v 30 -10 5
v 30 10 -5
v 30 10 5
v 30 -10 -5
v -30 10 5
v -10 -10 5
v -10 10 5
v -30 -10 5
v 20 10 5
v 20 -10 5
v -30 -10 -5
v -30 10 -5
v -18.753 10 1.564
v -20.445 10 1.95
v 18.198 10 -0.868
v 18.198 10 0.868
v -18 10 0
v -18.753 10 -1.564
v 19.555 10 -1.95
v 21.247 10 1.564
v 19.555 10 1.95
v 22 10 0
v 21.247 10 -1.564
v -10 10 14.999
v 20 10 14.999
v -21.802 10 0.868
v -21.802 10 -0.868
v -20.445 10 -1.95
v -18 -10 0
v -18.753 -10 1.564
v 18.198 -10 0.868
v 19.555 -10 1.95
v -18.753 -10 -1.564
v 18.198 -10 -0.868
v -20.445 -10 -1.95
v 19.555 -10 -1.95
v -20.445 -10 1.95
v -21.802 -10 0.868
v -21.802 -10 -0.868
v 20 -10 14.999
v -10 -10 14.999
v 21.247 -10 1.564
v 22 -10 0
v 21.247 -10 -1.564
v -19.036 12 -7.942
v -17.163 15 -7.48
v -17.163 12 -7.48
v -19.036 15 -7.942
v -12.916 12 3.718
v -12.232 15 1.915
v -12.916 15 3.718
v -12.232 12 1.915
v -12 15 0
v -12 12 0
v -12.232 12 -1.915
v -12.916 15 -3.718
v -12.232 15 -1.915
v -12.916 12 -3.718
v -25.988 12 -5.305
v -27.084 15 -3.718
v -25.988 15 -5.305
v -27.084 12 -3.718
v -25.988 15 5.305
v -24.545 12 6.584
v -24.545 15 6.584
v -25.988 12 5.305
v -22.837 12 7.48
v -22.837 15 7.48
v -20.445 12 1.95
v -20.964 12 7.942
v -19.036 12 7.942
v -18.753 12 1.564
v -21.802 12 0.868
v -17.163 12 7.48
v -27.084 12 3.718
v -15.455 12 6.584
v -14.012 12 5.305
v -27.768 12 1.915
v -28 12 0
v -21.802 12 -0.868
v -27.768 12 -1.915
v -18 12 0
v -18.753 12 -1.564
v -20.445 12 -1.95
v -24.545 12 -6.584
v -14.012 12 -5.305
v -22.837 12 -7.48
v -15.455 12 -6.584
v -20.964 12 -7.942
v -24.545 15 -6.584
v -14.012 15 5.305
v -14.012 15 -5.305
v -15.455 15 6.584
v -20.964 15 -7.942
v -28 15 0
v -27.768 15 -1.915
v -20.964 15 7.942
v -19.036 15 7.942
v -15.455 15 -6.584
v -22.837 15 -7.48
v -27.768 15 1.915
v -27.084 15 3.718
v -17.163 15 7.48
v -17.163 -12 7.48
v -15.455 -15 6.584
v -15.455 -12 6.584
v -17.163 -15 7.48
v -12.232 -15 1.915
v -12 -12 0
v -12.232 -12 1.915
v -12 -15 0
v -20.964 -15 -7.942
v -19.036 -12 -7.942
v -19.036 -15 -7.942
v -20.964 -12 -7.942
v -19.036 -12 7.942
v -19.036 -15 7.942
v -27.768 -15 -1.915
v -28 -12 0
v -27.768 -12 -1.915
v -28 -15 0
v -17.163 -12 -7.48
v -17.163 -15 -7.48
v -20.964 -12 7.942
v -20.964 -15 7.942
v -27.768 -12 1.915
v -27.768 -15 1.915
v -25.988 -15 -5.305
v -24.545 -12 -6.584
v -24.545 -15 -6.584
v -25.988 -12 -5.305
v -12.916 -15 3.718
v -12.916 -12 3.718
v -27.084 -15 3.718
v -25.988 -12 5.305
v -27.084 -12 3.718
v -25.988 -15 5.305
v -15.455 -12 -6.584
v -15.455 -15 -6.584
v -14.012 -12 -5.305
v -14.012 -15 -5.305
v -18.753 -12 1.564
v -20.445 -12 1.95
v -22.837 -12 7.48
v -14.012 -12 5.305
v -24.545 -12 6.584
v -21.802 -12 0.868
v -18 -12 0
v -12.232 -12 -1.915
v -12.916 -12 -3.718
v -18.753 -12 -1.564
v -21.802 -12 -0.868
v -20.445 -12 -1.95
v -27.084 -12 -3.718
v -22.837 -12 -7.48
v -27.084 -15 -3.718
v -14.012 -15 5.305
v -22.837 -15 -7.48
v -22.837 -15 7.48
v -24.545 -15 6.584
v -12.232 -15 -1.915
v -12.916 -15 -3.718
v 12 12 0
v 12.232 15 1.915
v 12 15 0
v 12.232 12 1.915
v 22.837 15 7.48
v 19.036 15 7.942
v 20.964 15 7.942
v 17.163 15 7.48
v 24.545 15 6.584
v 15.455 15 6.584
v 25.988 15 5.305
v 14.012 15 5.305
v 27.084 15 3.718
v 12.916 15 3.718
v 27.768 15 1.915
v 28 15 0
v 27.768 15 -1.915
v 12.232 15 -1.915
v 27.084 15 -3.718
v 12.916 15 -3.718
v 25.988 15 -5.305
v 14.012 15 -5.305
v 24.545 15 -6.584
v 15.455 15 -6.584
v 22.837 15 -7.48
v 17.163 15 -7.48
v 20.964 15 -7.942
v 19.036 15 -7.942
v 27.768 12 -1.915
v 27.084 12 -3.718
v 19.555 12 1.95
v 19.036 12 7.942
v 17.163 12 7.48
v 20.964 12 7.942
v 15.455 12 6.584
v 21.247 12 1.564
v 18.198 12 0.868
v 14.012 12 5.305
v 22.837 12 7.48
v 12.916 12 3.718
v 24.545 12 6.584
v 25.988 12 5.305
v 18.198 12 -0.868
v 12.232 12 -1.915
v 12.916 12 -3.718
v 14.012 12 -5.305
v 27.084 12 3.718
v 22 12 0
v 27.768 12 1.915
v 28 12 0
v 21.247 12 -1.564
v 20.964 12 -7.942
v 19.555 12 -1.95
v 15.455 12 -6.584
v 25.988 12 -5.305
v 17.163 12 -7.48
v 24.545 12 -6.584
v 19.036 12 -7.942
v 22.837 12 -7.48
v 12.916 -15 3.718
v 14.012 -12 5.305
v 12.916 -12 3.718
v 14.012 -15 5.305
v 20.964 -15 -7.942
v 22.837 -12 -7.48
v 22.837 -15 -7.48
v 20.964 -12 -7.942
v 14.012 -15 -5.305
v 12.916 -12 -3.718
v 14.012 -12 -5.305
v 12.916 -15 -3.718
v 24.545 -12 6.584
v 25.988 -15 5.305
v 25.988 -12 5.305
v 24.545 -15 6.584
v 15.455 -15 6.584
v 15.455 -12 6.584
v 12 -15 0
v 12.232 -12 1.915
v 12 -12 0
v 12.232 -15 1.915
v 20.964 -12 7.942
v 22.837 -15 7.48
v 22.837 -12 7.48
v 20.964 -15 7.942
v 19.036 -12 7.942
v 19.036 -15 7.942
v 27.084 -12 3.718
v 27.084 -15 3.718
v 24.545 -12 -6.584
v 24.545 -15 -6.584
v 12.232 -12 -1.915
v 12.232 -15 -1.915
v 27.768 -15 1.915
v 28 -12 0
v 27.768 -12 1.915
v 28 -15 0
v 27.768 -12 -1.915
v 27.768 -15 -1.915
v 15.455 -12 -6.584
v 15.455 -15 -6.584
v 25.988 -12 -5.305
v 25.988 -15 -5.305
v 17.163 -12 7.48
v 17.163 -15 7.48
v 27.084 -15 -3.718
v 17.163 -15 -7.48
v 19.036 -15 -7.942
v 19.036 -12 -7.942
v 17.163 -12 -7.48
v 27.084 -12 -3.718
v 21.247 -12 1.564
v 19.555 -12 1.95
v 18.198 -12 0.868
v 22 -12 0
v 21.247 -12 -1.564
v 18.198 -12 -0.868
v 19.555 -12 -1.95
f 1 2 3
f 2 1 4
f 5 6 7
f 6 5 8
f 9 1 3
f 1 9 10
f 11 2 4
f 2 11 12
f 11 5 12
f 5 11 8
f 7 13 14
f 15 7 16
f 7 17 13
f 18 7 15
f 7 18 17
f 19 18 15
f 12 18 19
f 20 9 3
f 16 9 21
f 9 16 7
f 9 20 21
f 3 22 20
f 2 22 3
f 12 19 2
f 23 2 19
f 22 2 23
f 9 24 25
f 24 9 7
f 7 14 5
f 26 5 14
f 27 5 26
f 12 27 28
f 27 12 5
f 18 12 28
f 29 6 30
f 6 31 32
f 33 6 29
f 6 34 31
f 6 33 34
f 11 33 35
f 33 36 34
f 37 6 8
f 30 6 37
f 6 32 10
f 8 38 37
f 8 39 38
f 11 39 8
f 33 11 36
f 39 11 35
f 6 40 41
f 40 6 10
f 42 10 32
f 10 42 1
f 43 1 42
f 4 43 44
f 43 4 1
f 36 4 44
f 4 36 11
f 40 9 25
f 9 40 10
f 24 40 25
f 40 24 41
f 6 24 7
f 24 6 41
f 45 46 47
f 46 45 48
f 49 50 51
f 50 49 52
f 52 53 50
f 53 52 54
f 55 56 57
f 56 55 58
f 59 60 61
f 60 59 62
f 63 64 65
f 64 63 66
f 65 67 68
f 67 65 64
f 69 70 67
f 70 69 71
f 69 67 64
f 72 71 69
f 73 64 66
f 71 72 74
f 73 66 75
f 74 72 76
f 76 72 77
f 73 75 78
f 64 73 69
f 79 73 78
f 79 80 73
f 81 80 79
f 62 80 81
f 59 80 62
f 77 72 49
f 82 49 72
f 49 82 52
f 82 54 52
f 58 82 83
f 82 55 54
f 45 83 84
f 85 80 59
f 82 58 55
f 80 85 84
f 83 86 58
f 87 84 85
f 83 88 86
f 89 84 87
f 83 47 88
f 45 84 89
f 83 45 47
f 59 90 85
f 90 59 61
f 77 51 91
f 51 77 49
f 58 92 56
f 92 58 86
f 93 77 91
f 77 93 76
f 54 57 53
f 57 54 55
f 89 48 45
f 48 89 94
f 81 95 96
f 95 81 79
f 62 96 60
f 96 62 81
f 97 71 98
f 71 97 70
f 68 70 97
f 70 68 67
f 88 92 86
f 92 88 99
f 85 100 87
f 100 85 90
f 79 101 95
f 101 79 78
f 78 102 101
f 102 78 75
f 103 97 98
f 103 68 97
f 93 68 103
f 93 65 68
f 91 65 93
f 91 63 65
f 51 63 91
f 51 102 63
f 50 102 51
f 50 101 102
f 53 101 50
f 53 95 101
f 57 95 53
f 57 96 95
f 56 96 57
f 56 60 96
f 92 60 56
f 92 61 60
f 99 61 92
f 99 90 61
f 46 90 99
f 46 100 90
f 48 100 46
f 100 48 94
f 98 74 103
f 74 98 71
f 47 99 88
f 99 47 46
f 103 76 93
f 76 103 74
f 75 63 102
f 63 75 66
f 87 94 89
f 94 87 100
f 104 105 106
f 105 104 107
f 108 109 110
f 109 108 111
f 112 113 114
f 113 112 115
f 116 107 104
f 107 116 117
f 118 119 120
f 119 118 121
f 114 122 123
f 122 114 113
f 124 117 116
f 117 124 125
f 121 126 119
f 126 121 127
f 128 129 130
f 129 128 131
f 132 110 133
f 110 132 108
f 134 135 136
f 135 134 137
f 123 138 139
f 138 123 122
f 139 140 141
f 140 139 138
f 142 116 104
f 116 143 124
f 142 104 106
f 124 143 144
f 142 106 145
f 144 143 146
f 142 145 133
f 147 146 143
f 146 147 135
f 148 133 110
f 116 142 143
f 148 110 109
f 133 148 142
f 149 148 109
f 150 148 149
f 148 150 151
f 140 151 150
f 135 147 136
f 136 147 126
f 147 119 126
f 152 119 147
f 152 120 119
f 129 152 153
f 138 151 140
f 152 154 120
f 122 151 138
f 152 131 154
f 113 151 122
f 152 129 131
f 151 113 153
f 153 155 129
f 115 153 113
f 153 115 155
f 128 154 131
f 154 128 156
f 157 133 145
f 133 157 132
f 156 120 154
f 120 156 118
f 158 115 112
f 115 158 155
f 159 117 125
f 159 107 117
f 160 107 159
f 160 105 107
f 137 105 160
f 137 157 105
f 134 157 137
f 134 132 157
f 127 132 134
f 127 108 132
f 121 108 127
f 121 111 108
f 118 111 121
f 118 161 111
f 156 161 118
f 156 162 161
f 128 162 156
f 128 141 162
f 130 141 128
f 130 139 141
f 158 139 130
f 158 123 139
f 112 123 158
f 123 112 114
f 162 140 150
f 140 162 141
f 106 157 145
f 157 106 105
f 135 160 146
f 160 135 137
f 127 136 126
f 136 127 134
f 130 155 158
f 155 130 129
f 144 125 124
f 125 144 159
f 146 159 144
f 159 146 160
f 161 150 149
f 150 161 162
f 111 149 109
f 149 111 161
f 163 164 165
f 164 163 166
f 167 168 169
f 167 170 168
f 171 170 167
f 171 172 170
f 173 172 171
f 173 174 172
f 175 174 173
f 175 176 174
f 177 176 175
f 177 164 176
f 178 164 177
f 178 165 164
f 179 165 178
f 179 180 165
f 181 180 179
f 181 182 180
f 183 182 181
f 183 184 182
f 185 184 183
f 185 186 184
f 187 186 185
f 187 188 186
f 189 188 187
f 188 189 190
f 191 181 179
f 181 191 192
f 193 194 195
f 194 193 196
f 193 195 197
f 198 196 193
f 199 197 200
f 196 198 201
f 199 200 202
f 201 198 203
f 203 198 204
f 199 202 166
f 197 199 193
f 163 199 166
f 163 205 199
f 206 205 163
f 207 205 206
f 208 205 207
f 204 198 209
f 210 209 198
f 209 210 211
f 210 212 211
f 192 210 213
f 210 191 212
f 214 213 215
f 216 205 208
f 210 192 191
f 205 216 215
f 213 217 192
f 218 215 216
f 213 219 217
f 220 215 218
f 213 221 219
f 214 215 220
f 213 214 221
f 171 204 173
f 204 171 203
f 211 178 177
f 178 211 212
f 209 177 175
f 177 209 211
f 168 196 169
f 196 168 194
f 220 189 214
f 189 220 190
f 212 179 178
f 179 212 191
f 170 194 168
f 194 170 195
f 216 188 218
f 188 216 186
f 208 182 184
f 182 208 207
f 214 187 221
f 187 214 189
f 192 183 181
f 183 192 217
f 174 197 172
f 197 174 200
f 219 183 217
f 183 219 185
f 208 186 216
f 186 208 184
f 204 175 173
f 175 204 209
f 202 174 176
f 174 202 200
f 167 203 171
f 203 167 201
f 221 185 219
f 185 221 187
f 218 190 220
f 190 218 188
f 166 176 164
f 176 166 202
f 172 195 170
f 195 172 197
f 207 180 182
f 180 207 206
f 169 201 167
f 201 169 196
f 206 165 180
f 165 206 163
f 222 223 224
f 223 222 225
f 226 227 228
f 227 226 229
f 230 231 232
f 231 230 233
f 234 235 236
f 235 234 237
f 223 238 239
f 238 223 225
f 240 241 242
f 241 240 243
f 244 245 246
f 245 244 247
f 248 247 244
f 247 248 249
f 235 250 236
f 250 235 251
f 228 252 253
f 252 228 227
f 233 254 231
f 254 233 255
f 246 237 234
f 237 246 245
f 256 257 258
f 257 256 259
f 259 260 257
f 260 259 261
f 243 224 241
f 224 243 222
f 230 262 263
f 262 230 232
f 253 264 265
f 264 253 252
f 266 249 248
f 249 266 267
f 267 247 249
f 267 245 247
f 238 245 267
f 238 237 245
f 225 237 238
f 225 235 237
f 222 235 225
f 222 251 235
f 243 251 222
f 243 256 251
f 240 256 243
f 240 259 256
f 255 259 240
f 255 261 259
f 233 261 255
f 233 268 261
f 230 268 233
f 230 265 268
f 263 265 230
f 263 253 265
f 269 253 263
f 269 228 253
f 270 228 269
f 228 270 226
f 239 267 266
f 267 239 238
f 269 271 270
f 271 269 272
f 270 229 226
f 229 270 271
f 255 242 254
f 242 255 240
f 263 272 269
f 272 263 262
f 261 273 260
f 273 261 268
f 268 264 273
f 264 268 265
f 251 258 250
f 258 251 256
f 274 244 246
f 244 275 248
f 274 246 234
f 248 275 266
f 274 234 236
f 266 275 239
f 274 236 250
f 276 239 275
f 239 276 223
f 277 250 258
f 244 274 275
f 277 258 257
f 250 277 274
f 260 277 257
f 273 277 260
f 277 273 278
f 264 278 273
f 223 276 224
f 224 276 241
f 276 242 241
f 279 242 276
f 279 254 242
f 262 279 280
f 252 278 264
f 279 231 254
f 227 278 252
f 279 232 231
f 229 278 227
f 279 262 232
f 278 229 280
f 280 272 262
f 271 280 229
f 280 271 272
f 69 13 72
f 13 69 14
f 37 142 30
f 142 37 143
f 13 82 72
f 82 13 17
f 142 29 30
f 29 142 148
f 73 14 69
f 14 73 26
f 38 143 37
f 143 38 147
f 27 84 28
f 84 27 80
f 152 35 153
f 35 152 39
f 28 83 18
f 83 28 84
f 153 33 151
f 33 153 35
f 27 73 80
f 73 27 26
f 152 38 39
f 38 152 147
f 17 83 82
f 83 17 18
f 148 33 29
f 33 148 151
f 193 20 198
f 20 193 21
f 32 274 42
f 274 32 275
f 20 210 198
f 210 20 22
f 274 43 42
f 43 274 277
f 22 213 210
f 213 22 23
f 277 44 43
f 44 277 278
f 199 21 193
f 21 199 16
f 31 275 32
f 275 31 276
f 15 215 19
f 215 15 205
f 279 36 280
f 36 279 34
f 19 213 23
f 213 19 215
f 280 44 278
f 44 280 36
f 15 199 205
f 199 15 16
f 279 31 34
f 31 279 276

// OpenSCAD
adjoiningTranslateReduction = 0.001;
carHeight = 10;
carLength = 60;
carWidth = 20;
wheelWidth = 3;
axilLength = 30;
axilRadius = 2;

// $fa = 1;
// $fs = 0.4;

CarBody();
FrontRightWheel();
FrontLeftWheel();
BackRightWheel();
BackLeftWheel();
FrontAxil();
ReacAxil();

module FrontAxil() {
    translate([ -carLength/3, 0, 0])
    Axil();
}

module ReacAxil() {
    translate([ carLength/3, 0, 0])
    Axil();
}

module Axil() {
    rotate([90,0,0])
        cylinder(h=axilLength, r=axilRadius, center=true);
}

module CarBody() {
    cube ([carLength,carWidth,carHeight], center=true);
    translate([5,0,carHeight  - adjoiningTranslateReduction])
        cube ([carLength/2,carWidth,carHeight], center=true);
}

module BackLeftWheel() {
    mirror([1,0,0])
        mirror([0,1,0])
            FrontRightWheel();
}

module FrontLeftWheel () {
    mirror([0,1,0])
        FrontRightWheel();
}

module BackRightWheel() {
    mirror([1,0,0])
        FrontRightWheel();
}

module FrontRightWheel () {
    translate([-carLength/3, carWidth/2 + wheelWidth/2 + 2, 0])
    rotate([90,0,0])
        cylinder(h=wheelWidth, r=8, center=true);
}




// // intersection(){
// //     cube(size=10, center=true);
// //     rotate([30,30,0])
// //         cube(size=10, center=true);
// //     rotate([0,30,300])
// //         cube(size=10, center=true);
// // }

// intersection(){
//     RingFrom(15, 6) {
//         circle(d=30);
//     }
// }


// // helpers
// module RingFrom(radius, count)
// {
//     for (a = [0 : count - 1]) {
//         angle = a * 360 / count;
//         translate(radius * [sin(angle), -cos(angle), 0])
//             rotate([0, 0, angle])
//                 children();
//     }
// }
